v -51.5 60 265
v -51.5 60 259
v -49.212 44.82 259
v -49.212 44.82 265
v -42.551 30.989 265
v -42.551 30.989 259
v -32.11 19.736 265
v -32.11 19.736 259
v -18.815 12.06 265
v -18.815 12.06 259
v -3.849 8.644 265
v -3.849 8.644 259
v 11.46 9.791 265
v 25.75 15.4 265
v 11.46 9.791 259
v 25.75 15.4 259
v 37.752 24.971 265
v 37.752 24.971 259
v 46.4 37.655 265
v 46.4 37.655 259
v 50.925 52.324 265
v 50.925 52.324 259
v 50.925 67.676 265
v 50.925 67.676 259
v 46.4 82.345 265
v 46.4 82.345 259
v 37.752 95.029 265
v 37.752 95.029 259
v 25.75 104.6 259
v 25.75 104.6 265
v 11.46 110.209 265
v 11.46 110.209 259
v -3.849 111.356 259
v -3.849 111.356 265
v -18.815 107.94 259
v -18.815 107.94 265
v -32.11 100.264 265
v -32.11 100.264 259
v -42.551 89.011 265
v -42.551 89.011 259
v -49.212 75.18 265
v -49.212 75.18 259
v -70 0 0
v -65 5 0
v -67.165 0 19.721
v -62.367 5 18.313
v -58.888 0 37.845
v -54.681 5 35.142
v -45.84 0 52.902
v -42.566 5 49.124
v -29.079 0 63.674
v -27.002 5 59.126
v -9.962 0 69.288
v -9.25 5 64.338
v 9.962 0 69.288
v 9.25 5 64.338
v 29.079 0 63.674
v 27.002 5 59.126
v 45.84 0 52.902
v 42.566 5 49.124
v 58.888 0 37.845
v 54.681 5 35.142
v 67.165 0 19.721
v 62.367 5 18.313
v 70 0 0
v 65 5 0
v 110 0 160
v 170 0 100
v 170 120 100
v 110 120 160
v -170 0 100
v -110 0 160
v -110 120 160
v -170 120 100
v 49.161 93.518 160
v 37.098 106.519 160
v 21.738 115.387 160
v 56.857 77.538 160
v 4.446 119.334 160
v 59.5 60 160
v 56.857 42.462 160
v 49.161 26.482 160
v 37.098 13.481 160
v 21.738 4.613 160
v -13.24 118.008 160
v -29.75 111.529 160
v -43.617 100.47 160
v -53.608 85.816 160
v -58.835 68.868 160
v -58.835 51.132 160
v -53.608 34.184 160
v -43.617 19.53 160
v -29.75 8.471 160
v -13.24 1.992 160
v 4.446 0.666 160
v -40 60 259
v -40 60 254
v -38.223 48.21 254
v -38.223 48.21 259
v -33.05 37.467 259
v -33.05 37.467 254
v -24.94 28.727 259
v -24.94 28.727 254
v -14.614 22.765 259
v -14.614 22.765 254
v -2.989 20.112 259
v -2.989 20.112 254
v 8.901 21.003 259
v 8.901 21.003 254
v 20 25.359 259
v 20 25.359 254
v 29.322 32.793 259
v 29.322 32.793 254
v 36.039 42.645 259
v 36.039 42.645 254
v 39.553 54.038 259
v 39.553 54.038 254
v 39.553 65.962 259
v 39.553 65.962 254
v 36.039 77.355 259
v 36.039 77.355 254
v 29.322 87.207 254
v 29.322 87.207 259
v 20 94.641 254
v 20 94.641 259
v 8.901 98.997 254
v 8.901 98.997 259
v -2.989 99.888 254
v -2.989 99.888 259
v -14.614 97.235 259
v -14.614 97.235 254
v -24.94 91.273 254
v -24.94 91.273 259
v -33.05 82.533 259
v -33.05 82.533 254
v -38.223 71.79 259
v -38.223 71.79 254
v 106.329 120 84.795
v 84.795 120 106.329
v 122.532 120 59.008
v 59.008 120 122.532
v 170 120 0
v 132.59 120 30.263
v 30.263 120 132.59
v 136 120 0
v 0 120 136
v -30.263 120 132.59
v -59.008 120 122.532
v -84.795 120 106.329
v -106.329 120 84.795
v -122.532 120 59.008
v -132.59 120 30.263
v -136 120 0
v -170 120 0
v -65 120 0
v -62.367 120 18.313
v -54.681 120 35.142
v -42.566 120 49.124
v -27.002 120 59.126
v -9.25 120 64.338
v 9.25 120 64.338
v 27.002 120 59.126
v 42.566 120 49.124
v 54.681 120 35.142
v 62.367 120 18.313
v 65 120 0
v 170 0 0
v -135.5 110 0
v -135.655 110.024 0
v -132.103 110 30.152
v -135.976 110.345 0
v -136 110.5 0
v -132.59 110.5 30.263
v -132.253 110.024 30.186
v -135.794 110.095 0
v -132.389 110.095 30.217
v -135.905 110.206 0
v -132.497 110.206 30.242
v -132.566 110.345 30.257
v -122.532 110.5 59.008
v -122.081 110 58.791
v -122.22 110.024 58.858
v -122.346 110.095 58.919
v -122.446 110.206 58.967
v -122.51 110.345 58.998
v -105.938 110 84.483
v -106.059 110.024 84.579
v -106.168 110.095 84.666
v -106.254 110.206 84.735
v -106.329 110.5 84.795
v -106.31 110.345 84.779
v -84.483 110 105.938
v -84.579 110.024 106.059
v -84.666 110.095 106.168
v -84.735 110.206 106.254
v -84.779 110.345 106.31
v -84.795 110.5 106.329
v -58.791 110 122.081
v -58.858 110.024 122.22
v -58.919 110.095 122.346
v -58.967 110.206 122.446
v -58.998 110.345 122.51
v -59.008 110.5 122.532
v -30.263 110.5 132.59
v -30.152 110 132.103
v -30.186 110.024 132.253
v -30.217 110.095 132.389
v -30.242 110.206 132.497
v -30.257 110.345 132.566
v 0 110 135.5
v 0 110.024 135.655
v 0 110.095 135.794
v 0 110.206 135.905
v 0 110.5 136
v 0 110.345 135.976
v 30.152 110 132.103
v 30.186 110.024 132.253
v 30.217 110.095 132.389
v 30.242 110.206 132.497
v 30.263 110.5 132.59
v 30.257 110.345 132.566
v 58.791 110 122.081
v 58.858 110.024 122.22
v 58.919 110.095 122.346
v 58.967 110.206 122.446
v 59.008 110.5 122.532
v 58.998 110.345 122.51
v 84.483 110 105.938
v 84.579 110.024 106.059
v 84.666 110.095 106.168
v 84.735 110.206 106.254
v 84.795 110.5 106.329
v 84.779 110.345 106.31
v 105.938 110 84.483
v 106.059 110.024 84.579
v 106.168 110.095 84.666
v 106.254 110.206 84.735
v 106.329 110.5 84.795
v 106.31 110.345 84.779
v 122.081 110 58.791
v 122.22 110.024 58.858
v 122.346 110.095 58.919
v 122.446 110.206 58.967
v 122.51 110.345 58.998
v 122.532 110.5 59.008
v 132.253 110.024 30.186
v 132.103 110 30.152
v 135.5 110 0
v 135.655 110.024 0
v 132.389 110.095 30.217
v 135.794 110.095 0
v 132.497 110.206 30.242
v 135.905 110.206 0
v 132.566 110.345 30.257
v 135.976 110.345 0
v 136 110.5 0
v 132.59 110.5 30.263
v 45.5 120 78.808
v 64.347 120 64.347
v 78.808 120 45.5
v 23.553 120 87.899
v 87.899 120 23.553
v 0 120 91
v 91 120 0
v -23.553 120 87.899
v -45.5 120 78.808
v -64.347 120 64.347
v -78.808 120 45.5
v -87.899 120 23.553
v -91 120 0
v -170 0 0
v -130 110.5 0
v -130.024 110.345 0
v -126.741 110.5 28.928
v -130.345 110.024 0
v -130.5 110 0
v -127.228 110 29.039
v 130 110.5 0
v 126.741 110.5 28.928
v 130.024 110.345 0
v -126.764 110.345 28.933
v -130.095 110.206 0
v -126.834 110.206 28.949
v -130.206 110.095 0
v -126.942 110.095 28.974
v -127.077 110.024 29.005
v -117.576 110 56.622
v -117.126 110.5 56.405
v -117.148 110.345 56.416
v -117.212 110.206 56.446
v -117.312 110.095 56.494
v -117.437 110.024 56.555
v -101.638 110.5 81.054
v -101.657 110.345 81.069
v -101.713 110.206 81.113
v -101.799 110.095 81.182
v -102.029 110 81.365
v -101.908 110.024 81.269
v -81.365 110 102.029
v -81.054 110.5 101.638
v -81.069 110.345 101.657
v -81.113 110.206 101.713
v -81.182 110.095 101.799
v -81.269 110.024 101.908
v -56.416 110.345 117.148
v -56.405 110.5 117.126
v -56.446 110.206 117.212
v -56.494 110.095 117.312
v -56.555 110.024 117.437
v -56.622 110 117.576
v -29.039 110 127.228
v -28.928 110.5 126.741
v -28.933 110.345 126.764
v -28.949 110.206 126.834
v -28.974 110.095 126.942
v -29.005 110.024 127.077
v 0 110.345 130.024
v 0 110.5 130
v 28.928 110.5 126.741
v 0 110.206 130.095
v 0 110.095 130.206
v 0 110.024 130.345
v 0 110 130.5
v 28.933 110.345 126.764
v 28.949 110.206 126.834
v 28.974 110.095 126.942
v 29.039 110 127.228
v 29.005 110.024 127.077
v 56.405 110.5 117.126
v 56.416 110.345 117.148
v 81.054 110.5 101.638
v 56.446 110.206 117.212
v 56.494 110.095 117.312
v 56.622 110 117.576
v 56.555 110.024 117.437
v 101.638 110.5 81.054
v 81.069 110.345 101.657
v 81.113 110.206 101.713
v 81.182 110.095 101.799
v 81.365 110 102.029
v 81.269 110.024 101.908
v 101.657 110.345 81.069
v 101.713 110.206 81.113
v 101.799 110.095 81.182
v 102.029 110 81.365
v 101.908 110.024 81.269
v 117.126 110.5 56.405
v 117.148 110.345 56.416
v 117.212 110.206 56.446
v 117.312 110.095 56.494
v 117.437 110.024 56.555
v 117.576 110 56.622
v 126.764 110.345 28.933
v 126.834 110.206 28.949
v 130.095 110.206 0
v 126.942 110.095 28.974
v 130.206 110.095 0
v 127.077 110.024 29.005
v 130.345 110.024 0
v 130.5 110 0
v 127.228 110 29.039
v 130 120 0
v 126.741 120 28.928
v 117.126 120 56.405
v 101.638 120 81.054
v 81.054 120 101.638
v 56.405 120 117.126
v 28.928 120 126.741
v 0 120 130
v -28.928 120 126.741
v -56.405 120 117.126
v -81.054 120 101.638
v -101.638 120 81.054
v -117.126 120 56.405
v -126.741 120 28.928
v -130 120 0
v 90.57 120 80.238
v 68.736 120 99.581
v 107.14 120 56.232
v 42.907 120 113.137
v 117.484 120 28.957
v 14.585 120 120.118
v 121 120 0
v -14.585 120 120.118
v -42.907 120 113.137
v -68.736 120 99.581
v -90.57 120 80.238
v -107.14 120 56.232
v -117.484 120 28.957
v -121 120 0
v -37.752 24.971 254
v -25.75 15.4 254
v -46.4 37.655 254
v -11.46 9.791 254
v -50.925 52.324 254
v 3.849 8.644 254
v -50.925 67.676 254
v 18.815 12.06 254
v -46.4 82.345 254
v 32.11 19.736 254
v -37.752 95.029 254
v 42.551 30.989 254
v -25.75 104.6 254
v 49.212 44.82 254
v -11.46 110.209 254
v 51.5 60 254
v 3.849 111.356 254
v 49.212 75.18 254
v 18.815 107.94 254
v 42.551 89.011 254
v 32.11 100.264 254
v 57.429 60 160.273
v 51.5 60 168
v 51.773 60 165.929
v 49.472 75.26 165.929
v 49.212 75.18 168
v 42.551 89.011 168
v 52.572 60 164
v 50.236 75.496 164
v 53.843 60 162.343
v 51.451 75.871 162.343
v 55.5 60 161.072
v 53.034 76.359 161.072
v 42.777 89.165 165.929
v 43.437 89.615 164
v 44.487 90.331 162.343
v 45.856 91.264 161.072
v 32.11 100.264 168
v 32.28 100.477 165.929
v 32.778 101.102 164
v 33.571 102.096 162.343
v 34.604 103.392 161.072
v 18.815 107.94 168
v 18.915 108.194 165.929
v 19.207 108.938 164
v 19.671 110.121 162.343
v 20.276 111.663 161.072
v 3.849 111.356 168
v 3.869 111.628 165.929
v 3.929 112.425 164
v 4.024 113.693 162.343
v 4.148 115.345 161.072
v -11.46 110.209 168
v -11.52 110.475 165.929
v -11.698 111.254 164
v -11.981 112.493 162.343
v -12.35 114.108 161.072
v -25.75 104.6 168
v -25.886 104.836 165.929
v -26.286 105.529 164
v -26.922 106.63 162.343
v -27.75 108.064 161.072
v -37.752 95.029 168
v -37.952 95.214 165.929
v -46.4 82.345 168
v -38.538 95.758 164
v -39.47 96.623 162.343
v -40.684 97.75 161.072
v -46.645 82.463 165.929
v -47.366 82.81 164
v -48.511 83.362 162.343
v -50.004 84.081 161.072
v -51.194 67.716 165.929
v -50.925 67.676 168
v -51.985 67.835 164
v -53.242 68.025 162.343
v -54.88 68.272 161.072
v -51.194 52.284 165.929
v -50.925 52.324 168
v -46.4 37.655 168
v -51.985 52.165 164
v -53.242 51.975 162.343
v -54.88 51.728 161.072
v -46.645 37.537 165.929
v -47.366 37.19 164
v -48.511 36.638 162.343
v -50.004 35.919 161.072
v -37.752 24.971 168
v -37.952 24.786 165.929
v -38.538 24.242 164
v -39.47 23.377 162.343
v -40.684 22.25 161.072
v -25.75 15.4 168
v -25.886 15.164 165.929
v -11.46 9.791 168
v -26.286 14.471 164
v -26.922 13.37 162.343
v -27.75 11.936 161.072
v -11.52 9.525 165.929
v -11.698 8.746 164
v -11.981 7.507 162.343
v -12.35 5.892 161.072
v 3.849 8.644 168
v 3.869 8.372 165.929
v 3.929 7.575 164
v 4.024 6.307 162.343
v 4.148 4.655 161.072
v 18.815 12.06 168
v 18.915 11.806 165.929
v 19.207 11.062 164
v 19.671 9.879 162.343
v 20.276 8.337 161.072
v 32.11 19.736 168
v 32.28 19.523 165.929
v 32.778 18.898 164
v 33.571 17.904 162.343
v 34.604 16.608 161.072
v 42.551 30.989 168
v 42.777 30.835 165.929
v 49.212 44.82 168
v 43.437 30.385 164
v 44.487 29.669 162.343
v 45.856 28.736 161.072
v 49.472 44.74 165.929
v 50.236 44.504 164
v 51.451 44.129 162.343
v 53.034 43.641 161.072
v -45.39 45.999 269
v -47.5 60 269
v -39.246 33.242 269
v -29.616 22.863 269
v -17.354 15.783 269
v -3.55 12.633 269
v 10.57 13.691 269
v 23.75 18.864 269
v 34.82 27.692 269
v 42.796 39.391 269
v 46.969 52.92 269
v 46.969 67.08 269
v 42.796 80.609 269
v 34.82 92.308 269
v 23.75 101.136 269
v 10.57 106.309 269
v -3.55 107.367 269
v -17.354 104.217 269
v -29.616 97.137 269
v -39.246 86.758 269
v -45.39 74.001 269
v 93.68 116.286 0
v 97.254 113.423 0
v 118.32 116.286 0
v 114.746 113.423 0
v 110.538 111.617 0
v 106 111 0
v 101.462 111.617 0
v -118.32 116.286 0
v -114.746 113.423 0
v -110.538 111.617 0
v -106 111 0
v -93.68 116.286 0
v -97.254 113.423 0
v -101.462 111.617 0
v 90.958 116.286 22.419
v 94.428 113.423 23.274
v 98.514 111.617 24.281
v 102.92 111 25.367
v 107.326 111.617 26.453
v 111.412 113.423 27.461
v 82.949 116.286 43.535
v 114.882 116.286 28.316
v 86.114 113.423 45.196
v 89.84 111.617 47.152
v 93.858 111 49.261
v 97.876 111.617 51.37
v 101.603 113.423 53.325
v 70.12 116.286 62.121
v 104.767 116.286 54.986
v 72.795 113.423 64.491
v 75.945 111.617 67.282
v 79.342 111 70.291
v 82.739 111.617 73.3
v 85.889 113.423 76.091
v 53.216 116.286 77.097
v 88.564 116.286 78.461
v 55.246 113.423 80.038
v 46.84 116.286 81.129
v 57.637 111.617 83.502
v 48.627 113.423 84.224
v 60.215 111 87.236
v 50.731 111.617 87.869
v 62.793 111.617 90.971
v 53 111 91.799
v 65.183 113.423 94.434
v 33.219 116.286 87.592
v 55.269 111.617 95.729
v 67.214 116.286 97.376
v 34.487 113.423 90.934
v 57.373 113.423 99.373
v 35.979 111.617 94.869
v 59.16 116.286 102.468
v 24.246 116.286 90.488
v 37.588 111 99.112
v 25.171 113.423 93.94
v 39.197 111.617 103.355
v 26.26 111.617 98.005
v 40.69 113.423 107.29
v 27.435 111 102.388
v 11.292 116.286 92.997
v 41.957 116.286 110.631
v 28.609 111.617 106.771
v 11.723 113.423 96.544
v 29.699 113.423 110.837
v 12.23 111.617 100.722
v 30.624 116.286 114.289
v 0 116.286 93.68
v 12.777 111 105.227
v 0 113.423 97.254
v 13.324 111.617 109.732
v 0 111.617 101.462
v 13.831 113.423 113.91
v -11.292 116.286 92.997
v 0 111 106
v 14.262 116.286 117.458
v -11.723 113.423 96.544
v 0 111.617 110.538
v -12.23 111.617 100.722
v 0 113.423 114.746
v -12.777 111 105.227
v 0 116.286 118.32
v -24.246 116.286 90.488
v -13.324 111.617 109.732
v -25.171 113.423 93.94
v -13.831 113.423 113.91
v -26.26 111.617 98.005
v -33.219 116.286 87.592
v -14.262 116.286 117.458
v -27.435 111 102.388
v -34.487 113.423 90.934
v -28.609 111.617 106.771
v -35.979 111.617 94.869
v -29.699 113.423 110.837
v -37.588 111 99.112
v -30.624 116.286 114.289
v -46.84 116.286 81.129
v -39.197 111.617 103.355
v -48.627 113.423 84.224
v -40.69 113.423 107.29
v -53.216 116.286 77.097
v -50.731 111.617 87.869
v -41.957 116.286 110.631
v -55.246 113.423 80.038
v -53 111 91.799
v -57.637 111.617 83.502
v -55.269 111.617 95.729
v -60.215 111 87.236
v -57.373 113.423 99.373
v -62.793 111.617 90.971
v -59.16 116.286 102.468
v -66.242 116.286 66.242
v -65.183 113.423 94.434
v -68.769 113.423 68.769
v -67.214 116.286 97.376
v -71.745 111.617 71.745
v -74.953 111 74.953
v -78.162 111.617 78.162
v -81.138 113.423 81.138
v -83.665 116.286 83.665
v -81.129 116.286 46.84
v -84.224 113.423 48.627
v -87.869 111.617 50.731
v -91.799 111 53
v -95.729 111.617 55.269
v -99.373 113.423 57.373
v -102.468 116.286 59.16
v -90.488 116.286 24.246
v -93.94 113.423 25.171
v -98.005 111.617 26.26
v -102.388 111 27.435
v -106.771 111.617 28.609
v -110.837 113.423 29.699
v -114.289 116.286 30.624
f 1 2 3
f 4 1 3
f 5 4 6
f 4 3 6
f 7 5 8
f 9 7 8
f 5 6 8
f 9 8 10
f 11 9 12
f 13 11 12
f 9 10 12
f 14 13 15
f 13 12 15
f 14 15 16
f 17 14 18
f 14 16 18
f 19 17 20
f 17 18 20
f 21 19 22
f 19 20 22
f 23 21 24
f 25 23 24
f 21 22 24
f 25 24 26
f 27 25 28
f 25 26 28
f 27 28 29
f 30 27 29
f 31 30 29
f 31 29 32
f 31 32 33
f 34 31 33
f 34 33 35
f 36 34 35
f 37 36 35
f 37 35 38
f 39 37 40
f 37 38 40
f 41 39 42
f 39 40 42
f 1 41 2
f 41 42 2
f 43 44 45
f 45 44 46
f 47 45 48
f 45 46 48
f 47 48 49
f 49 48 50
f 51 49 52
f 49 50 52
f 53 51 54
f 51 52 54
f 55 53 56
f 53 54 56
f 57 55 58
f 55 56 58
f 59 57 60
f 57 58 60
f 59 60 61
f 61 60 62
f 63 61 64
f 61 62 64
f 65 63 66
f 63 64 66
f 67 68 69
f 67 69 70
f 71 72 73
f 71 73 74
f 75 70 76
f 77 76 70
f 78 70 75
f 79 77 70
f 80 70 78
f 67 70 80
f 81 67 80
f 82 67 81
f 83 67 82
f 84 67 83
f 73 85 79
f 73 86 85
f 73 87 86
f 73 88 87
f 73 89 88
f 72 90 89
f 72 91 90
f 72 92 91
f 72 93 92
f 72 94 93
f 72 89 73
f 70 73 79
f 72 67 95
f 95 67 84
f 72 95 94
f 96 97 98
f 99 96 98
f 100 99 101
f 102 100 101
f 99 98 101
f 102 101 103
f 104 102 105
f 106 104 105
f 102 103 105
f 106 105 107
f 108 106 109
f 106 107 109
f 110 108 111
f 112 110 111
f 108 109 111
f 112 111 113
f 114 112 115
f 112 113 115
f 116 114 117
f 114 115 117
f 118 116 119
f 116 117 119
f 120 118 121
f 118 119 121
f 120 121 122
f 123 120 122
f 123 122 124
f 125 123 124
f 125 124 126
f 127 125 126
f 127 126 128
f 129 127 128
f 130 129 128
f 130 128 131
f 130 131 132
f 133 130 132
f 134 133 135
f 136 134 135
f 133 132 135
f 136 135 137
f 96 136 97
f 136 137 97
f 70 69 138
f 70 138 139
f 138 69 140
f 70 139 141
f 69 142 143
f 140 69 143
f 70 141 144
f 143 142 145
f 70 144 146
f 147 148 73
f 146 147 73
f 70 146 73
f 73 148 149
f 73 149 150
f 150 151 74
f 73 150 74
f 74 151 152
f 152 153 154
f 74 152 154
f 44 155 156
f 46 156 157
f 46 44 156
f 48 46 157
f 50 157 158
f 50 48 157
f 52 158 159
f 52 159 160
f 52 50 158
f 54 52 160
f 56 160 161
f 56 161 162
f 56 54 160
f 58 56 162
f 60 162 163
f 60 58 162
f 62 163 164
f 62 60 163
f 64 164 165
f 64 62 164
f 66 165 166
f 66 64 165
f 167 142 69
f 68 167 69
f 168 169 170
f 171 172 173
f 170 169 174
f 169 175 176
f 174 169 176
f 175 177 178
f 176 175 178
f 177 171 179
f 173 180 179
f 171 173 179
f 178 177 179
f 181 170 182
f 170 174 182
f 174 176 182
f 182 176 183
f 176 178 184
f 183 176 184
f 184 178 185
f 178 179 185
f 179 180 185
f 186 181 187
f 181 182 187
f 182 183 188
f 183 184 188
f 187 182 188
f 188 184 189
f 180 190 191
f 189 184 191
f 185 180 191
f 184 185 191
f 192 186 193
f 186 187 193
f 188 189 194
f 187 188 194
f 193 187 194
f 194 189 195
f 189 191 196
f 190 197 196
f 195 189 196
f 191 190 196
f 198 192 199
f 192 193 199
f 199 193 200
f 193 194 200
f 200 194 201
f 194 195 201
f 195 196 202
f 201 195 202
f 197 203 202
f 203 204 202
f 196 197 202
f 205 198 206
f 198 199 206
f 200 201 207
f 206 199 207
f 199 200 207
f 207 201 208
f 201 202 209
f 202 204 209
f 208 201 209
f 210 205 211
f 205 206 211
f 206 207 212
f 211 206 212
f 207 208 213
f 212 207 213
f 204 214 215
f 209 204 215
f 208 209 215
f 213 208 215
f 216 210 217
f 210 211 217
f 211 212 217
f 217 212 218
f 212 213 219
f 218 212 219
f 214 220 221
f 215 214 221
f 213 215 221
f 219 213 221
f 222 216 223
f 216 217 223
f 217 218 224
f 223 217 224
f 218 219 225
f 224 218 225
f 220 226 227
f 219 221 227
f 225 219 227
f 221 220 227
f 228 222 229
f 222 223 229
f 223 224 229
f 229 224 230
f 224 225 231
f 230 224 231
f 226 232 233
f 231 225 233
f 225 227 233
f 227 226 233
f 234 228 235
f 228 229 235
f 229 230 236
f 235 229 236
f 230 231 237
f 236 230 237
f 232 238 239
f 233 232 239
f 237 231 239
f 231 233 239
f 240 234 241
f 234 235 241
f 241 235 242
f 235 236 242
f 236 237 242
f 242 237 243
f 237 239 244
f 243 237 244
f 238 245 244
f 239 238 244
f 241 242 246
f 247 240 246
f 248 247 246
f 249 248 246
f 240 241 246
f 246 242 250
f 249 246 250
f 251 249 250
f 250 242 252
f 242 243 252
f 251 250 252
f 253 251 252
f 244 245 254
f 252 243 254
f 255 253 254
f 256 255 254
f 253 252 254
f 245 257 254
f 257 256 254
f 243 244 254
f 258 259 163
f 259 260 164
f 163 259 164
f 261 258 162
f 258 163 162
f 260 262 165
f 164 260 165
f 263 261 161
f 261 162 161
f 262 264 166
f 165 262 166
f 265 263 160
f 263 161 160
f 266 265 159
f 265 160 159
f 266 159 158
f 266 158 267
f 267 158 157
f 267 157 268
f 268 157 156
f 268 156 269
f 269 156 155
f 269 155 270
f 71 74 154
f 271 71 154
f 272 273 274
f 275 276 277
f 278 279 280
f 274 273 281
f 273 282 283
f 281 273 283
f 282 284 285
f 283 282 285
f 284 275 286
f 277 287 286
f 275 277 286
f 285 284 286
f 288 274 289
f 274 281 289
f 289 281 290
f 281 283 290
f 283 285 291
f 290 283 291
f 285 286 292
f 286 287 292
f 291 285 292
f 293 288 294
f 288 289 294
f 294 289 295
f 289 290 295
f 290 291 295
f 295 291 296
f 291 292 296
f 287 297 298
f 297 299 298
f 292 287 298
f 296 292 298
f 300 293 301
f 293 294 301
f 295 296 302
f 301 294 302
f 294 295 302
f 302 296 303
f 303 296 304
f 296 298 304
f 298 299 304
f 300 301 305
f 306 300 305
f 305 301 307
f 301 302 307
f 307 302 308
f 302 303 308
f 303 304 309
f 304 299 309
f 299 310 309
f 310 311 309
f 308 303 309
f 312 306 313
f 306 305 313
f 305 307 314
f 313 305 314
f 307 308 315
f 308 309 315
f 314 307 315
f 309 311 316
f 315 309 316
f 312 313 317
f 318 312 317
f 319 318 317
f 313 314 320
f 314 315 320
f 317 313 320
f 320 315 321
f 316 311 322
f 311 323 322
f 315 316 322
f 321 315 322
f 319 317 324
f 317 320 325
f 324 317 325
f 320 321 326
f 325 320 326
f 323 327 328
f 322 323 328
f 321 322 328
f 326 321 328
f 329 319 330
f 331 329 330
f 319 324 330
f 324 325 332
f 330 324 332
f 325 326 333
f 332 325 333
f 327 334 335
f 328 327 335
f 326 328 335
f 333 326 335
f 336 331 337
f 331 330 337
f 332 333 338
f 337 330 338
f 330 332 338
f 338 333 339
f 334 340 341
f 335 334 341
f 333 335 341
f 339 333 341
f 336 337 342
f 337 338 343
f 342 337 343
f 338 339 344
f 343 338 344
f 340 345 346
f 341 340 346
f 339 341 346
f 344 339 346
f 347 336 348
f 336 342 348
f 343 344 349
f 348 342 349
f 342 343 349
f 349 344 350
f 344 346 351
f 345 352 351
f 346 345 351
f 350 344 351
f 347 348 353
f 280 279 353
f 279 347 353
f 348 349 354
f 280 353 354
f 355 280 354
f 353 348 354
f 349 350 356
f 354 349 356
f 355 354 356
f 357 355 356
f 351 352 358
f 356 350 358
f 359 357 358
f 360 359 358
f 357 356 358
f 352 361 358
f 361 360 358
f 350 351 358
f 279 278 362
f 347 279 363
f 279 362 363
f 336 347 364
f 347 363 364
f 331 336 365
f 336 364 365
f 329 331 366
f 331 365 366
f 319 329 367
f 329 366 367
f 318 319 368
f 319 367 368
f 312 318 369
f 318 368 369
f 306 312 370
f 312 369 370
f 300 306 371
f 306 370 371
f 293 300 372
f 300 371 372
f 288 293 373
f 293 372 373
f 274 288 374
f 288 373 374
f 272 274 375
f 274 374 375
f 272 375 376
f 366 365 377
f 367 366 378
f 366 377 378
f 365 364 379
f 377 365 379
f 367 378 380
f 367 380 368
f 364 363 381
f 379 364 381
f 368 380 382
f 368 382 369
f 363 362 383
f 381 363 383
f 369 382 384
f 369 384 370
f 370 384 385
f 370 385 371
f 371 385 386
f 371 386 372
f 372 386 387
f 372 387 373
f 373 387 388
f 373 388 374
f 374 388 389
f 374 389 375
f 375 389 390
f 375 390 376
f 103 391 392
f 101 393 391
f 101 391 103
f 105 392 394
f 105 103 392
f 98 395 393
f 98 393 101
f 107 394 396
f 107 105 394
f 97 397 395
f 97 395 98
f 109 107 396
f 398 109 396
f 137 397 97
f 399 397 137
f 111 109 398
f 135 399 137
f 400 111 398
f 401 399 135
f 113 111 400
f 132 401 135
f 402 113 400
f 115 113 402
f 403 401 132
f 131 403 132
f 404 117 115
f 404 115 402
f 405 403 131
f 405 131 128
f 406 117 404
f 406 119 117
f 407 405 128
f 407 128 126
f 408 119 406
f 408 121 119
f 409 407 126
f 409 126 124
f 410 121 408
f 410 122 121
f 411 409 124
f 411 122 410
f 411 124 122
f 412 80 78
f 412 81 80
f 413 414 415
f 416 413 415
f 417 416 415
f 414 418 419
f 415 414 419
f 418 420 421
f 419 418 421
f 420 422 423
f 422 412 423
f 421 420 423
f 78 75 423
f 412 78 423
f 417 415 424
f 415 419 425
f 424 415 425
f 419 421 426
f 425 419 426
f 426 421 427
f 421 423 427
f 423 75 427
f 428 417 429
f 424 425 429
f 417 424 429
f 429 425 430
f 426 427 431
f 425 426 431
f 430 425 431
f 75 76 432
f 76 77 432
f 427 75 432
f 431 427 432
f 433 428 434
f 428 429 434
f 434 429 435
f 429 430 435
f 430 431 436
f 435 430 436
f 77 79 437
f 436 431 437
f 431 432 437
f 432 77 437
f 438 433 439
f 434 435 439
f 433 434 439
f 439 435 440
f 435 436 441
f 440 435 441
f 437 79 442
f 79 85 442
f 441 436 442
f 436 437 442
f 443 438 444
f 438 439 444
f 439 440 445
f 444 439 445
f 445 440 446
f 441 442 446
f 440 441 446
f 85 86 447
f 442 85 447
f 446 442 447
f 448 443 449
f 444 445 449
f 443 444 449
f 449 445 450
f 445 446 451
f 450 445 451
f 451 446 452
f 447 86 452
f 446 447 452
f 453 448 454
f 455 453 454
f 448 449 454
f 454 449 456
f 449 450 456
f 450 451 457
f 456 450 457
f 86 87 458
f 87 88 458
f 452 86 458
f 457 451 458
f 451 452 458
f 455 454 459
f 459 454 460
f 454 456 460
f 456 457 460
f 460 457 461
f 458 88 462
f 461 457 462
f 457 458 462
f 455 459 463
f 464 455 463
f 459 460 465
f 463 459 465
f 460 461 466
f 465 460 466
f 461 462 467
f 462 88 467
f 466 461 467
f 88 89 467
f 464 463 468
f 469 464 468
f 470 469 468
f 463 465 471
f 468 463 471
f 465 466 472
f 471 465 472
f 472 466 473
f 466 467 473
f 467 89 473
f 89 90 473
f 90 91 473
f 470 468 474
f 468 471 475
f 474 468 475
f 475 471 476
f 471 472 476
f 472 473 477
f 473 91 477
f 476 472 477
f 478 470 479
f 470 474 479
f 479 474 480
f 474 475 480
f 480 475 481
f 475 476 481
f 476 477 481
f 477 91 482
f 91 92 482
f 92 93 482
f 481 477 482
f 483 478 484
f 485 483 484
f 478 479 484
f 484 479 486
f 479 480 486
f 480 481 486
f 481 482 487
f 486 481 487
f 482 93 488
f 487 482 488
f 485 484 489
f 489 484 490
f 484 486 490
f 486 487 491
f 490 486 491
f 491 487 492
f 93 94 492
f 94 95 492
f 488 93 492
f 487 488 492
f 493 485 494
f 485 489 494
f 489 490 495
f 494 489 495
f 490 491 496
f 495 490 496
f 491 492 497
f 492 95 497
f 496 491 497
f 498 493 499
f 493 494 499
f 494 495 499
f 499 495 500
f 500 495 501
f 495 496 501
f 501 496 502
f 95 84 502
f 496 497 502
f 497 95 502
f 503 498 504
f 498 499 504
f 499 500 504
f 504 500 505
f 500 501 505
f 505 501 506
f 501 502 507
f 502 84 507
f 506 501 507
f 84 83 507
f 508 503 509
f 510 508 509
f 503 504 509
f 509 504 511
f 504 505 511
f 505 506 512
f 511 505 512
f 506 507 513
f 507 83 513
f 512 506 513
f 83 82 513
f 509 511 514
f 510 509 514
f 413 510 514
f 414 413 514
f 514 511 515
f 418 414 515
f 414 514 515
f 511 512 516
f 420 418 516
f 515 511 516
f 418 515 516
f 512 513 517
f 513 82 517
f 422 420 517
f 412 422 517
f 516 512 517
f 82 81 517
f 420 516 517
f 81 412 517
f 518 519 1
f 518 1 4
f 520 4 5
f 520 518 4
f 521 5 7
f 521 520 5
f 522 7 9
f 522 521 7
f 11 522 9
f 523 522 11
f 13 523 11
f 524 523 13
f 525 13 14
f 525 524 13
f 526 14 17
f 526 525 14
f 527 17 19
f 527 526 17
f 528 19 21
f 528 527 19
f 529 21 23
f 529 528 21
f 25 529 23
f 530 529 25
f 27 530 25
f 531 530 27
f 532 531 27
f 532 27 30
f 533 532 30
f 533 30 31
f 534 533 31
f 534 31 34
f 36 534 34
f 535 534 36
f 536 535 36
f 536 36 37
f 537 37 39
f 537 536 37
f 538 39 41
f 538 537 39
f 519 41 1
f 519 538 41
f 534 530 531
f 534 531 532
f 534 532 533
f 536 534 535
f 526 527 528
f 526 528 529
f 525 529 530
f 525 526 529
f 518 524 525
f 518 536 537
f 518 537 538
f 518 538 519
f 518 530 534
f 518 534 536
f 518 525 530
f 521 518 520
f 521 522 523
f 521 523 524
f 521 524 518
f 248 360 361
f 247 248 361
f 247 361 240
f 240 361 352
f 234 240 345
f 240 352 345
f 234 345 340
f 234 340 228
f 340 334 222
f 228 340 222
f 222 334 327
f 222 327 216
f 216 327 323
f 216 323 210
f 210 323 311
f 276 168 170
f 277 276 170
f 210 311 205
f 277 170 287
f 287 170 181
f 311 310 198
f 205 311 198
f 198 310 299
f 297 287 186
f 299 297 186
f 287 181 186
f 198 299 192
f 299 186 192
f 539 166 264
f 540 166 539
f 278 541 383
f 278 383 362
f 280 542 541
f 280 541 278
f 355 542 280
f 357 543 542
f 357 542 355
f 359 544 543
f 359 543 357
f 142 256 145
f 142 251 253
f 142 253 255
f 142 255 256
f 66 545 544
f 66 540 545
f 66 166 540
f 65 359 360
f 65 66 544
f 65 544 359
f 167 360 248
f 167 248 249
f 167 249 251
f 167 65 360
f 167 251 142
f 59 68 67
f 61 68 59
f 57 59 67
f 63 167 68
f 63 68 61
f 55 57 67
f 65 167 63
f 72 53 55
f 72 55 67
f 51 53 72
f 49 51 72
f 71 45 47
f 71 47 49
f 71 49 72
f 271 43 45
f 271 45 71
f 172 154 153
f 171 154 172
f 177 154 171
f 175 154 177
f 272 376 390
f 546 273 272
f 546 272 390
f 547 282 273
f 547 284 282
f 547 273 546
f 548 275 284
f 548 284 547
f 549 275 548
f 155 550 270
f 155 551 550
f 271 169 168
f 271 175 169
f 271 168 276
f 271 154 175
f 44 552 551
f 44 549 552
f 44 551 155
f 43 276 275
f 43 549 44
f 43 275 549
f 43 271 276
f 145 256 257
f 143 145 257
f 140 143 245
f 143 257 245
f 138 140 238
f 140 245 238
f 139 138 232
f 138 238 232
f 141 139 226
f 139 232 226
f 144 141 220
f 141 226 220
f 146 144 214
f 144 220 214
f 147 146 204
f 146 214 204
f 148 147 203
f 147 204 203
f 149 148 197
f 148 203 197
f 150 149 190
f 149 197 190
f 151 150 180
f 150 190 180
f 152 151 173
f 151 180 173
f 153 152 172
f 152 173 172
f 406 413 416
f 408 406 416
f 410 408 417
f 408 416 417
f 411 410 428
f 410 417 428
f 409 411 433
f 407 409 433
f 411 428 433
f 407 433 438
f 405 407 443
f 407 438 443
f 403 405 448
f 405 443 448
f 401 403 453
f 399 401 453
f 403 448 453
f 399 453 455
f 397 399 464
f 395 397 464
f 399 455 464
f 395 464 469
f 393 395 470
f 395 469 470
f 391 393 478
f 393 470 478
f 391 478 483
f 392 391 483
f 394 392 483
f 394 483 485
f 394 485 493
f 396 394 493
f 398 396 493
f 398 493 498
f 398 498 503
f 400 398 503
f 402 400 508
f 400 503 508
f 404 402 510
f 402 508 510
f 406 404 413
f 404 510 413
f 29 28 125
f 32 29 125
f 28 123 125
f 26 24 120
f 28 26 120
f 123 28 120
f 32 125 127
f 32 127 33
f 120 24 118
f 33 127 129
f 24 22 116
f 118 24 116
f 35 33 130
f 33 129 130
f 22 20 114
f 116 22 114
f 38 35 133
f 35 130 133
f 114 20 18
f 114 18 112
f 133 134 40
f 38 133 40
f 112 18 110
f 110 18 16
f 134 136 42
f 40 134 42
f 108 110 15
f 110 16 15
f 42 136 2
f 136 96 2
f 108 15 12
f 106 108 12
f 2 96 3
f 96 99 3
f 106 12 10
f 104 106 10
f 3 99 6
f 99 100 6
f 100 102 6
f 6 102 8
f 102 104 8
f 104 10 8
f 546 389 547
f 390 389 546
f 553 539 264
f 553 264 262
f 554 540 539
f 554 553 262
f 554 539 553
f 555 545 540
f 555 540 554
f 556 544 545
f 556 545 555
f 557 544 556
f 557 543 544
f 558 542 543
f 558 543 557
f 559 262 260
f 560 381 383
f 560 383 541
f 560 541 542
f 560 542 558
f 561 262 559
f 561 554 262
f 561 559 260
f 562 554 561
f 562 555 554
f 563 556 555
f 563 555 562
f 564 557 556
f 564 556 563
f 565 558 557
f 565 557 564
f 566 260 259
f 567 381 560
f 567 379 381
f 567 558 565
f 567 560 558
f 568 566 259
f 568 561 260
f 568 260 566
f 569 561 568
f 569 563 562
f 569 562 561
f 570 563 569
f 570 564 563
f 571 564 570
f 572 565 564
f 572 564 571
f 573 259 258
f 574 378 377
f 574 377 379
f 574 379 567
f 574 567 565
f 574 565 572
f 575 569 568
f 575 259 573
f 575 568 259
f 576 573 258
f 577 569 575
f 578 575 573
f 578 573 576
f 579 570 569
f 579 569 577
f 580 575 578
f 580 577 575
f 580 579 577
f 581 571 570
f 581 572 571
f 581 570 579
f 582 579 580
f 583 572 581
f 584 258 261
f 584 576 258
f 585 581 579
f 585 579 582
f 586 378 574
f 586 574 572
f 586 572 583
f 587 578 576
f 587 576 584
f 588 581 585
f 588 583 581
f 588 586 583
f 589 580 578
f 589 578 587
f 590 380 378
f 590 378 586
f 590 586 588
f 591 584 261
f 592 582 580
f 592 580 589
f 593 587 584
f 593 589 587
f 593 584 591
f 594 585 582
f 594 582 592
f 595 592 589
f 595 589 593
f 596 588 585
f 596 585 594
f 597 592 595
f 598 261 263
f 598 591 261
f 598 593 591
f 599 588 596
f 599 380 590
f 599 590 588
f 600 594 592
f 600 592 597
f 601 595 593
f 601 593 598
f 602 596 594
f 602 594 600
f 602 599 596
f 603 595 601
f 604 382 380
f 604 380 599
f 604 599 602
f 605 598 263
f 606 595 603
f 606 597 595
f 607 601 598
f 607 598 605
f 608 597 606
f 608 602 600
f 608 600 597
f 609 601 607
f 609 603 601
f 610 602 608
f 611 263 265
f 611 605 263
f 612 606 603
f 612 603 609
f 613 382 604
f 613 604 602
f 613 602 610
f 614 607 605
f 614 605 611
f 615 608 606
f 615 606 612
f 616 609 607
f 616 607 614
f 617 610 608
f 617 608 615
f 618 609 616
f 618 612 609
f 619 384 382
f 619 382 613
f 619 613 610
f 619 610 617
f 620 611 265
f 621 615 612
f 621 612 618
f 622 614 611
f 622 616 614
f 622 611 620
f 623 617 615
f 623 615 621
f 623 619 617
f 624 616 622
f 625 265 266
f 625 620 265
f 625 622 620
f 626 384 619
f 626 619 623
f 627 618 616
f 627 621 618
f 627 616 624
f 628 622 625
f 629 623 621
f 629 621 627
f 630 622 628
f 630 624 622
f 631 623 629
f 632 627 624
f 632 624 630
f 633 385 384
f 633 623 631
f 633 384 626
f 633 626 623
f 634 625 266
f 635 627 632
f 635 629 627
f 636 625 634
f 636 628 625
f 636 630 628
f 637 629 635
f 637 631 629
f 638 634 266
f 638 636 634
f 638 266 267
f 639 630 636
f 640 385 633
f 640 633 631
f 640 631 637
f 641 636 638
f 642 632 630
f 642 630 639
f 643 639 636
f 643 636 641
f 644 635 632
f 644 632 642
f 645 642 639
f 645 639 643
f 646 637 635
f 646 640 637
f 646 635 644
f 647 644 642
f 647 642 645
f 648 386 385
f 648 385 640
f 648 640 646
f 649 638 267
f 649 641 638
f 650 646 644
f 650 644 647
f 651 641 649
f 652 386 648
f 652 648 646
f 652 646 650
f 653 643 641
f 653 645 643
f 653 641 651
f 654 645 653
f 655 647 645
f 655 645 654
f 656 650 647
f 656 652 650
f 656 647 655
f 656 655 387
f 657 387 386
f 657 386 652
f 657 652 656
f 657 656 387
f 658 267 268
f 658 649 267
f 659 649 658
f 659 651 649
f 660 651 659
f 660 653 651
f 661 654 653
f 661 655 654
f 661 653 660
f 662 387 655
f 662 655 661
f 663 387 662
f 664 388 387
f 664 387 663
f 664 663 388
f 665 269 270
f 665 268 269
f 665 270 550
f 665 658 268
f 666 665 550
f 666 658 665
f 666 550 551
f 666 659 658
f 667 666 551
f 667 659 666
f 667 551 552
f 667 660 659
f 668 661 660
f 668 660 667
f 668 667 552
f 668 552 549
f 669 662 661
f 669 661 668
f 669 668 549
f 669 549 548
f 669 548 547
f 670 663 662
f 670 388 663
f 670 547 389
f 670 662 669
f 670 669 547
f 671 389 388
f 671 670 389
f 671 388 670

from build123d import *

# Parameters (mm, degrees)
MAIN_DEPTH                = 120
PERNO1_START              = 160
PERNO1_OUTLINE_R          = 51.5
PERNO1_DEPTH              = 94
PERNO1_2_OUTLINE_R        = 65
PERNO1_2_DEPTH            = 120
SANALATURAPERNO_START     = 254
SKETCH4_3_R               = 40
SANALATURAPERNO_DEPTH     = 5
PERNO2_START              = 259
SKETCH4_4_R               = 51.5
SKETCH4_4_R_2             = 40
PERNO2_DEPTH              = 10
CHAMFER1_SIZE             = 4
FILLET2_R                 = 8
CHAMFER1_OF_MIRROR14_SIZE = 4
FILLET2_OF_MIRROR14_R     = 8
CHAMFER2_SIZE             = 5
PISTA_R                   = 17
SKETCH9_W                 = 397.156797082
SKETCH9_H                 = 271.545663618
CUT_EXTRUDE4_DEPTH        = 120
FILLET3_R                 = 0.5


# Read off the part's stored shape, not the designer's step: Perno1
with BuildPart() as part:
    # MainBody → Main (new body)
    with BuildSketch(Plane(origin=(0, 0, 0), x_dir=(1, 0, 0), z_dir=(0, 1, 0))):
        Polygon((-110, 160), (110, 160), (170, 100), (170, -100), (110, -160), (-110, -160), (-170, -100), (-170, 100), align=None)
    extrude(amount=MAIN_DEPTH)

    # Perno1 outline → Perno1 (add)
    with BuildSketch(Plane.XY.offset(PERNO1_START)):
        with Locations((0, 60)):
            Circle(PERNO1_OUTLINE_R)
    perno1 = extrude(amount=PERNO1_DEPTH)

    # Perno1 2 outline → Perno1 2 (cut)
    with BuildSketch(Plane(origin=(0, 0, 0), x_dir=(1, 0, 0), z_dir=(0, 1, 0))):
        Circle(PERNO1_2_OUTLINE_R)
    perno1_2 = extrude(amount=PERNO1_2_DEPTH, mode=Mode.SUBTRACT)

    # Sketch4<3> → SanalaturaPerno (add)
    with BuildSketch(Plane.XY.offset(SANALATURAPERNO_START)):
        with Locations(Location((0, 60, 0), (0, 0, 180))):
            Circle(SKETCH4_3_R)
    sanalaturaperno = extrude(amount=SANALATURAPERNO_DEPTH)

    # Sketch4<4> → Perno2 (add)
    # profile 1 of 2: a face of its own
    with BuildSketch(Plane.XY.offset(PERNO2_START)):
        with Locations(Location((0, 60, 0), (0, 0, 180))):
            Circle(SKETCH4_4_R)
        with Locations(Location((0, 60, 0), (0, 0, 180))):
            Circle(SKETCH4_4_R_2, mode=Mode.SUBTRACT)
    # profile 2 of 2: a face of its own
    with BuildSketch(Plane.XY.offset(PERNO2_START)):
        with Locations(Location((0, 60, 0), (0, 0, 180))):
            Circle(SKETCH4_4_R_2)
    perno2 = extrude(amount=PERNO2_DEPTH)

    # Chamfer1
    chamfer1_edges = [part.edges().sort_by_distance(p)[0] for p in [
        (51.5, 60, 269),
    ]]
    chamfer(chamfer1_edges, length=CHAMFER1_SIZE)

    # Fillet2
    fillet2_edges = [part.edges().sort_by_distance(p)[0] for p in [
        (-51.5, 60, 160),
    ]]
    fillet(fillet2_edges, radius=FILLET2_R)

    # Mirror14: Perno1, Perno1 2, SanalaturaPerno, Perno2 across plane
    add(perno1.mirror(Plane.XY))
    add(perno1_2.mirror(Plane.XY), mode=Mode.SUBTRACT)
    add(sanalaturaperno.mirror(Plane.XY))
    add(perno2.mirror(Plane.XY))

    # Chamfer1 of Mirror14
    chamfer1_of_mirror14_edges = [part.edges().sort_by_distance(p)[0] for p in [
        (51.5, 60, -269),
    ]]
    chamfer(chamfer1_of_mirror14_edges, length=CHAMFER1_OF_MIRROR14_SIZE)

    # Fillet2 of Mirror14
    fillet2_of_mirror14_edges = [part.edges().sort_by_distance(p)[0] for p in [
        (-51.5, 60, -160),
    ]]
    fillet(fillet2_of_mirror14_edges, radius=FILLET2_OF_MIRROR14_R)

    # Chamfer2
    chamfer2_edges = [part.edges().sort_by_distance(p)[0] for p in [
        (-65, 0, 0),
    ]]
    chamfer(chamfer2_edges, length=CHAMFER2_SIZE)

    # Pista → PistaCut (revolve, cut)
    with BuildSketch(Plane.XY, mode=Mode.PRIVATE) as pistacut_sk:
        with Locations((106, 128)):
            Circle(PISTA_R)
    revolve(pistacut_sk.sketch.rotate(Axis((0, 120, 0), (0, -1, 0)), 90), axis=Axis((0, 120, 0), (0, -1, 0)), mode=Mode.SUBTRACT)

    # Sketch8 → Cut-Revolve2 (revolve, cut)
    with BuildSketch(Plane(origin=(0, 0, 0), x_dir=(0, 0, -1), z_dir=(1, 0, 0))):
        Polygon((-136, 141), (-136, 131), (-136, 120), (-136, 110), (-130, 110), (-130, 120), (-130, 124), (-130, 141), align=None)
    revolve(axis=Axis((0, 120, 0), (0, -1, 0)), mode=Mode.SUBTRACT)

    # Sketch9 → Cut-Extrude4 (cut)
    with BuildSketch(Plane(origin=(0, 0, 0), x_dir=(1, 0, 0), z_dir=(0, 1, 0))):
        with Locations((-21.107680821, 135.772831809)):
            Rectangle(SKETCH9_W, SKETCH9_H)
    extrude(amount=CUT_EXTRUDE4_DEPTH, mode=Mode.SUBTRACT)

    # Fillet3
    fillet3_edges = [part.edges().sort_by_distance(p)[0] for p in [
        (0, 110, 136),
        (0, 110, 136),
        (0, 110, 130),
        (0, 110, 130),
        (0, 110, 130),
        (0, 110, 136),
    ]]
    fillet(fillet3_edges, radius=FILLET3_R)


solid = part.part
